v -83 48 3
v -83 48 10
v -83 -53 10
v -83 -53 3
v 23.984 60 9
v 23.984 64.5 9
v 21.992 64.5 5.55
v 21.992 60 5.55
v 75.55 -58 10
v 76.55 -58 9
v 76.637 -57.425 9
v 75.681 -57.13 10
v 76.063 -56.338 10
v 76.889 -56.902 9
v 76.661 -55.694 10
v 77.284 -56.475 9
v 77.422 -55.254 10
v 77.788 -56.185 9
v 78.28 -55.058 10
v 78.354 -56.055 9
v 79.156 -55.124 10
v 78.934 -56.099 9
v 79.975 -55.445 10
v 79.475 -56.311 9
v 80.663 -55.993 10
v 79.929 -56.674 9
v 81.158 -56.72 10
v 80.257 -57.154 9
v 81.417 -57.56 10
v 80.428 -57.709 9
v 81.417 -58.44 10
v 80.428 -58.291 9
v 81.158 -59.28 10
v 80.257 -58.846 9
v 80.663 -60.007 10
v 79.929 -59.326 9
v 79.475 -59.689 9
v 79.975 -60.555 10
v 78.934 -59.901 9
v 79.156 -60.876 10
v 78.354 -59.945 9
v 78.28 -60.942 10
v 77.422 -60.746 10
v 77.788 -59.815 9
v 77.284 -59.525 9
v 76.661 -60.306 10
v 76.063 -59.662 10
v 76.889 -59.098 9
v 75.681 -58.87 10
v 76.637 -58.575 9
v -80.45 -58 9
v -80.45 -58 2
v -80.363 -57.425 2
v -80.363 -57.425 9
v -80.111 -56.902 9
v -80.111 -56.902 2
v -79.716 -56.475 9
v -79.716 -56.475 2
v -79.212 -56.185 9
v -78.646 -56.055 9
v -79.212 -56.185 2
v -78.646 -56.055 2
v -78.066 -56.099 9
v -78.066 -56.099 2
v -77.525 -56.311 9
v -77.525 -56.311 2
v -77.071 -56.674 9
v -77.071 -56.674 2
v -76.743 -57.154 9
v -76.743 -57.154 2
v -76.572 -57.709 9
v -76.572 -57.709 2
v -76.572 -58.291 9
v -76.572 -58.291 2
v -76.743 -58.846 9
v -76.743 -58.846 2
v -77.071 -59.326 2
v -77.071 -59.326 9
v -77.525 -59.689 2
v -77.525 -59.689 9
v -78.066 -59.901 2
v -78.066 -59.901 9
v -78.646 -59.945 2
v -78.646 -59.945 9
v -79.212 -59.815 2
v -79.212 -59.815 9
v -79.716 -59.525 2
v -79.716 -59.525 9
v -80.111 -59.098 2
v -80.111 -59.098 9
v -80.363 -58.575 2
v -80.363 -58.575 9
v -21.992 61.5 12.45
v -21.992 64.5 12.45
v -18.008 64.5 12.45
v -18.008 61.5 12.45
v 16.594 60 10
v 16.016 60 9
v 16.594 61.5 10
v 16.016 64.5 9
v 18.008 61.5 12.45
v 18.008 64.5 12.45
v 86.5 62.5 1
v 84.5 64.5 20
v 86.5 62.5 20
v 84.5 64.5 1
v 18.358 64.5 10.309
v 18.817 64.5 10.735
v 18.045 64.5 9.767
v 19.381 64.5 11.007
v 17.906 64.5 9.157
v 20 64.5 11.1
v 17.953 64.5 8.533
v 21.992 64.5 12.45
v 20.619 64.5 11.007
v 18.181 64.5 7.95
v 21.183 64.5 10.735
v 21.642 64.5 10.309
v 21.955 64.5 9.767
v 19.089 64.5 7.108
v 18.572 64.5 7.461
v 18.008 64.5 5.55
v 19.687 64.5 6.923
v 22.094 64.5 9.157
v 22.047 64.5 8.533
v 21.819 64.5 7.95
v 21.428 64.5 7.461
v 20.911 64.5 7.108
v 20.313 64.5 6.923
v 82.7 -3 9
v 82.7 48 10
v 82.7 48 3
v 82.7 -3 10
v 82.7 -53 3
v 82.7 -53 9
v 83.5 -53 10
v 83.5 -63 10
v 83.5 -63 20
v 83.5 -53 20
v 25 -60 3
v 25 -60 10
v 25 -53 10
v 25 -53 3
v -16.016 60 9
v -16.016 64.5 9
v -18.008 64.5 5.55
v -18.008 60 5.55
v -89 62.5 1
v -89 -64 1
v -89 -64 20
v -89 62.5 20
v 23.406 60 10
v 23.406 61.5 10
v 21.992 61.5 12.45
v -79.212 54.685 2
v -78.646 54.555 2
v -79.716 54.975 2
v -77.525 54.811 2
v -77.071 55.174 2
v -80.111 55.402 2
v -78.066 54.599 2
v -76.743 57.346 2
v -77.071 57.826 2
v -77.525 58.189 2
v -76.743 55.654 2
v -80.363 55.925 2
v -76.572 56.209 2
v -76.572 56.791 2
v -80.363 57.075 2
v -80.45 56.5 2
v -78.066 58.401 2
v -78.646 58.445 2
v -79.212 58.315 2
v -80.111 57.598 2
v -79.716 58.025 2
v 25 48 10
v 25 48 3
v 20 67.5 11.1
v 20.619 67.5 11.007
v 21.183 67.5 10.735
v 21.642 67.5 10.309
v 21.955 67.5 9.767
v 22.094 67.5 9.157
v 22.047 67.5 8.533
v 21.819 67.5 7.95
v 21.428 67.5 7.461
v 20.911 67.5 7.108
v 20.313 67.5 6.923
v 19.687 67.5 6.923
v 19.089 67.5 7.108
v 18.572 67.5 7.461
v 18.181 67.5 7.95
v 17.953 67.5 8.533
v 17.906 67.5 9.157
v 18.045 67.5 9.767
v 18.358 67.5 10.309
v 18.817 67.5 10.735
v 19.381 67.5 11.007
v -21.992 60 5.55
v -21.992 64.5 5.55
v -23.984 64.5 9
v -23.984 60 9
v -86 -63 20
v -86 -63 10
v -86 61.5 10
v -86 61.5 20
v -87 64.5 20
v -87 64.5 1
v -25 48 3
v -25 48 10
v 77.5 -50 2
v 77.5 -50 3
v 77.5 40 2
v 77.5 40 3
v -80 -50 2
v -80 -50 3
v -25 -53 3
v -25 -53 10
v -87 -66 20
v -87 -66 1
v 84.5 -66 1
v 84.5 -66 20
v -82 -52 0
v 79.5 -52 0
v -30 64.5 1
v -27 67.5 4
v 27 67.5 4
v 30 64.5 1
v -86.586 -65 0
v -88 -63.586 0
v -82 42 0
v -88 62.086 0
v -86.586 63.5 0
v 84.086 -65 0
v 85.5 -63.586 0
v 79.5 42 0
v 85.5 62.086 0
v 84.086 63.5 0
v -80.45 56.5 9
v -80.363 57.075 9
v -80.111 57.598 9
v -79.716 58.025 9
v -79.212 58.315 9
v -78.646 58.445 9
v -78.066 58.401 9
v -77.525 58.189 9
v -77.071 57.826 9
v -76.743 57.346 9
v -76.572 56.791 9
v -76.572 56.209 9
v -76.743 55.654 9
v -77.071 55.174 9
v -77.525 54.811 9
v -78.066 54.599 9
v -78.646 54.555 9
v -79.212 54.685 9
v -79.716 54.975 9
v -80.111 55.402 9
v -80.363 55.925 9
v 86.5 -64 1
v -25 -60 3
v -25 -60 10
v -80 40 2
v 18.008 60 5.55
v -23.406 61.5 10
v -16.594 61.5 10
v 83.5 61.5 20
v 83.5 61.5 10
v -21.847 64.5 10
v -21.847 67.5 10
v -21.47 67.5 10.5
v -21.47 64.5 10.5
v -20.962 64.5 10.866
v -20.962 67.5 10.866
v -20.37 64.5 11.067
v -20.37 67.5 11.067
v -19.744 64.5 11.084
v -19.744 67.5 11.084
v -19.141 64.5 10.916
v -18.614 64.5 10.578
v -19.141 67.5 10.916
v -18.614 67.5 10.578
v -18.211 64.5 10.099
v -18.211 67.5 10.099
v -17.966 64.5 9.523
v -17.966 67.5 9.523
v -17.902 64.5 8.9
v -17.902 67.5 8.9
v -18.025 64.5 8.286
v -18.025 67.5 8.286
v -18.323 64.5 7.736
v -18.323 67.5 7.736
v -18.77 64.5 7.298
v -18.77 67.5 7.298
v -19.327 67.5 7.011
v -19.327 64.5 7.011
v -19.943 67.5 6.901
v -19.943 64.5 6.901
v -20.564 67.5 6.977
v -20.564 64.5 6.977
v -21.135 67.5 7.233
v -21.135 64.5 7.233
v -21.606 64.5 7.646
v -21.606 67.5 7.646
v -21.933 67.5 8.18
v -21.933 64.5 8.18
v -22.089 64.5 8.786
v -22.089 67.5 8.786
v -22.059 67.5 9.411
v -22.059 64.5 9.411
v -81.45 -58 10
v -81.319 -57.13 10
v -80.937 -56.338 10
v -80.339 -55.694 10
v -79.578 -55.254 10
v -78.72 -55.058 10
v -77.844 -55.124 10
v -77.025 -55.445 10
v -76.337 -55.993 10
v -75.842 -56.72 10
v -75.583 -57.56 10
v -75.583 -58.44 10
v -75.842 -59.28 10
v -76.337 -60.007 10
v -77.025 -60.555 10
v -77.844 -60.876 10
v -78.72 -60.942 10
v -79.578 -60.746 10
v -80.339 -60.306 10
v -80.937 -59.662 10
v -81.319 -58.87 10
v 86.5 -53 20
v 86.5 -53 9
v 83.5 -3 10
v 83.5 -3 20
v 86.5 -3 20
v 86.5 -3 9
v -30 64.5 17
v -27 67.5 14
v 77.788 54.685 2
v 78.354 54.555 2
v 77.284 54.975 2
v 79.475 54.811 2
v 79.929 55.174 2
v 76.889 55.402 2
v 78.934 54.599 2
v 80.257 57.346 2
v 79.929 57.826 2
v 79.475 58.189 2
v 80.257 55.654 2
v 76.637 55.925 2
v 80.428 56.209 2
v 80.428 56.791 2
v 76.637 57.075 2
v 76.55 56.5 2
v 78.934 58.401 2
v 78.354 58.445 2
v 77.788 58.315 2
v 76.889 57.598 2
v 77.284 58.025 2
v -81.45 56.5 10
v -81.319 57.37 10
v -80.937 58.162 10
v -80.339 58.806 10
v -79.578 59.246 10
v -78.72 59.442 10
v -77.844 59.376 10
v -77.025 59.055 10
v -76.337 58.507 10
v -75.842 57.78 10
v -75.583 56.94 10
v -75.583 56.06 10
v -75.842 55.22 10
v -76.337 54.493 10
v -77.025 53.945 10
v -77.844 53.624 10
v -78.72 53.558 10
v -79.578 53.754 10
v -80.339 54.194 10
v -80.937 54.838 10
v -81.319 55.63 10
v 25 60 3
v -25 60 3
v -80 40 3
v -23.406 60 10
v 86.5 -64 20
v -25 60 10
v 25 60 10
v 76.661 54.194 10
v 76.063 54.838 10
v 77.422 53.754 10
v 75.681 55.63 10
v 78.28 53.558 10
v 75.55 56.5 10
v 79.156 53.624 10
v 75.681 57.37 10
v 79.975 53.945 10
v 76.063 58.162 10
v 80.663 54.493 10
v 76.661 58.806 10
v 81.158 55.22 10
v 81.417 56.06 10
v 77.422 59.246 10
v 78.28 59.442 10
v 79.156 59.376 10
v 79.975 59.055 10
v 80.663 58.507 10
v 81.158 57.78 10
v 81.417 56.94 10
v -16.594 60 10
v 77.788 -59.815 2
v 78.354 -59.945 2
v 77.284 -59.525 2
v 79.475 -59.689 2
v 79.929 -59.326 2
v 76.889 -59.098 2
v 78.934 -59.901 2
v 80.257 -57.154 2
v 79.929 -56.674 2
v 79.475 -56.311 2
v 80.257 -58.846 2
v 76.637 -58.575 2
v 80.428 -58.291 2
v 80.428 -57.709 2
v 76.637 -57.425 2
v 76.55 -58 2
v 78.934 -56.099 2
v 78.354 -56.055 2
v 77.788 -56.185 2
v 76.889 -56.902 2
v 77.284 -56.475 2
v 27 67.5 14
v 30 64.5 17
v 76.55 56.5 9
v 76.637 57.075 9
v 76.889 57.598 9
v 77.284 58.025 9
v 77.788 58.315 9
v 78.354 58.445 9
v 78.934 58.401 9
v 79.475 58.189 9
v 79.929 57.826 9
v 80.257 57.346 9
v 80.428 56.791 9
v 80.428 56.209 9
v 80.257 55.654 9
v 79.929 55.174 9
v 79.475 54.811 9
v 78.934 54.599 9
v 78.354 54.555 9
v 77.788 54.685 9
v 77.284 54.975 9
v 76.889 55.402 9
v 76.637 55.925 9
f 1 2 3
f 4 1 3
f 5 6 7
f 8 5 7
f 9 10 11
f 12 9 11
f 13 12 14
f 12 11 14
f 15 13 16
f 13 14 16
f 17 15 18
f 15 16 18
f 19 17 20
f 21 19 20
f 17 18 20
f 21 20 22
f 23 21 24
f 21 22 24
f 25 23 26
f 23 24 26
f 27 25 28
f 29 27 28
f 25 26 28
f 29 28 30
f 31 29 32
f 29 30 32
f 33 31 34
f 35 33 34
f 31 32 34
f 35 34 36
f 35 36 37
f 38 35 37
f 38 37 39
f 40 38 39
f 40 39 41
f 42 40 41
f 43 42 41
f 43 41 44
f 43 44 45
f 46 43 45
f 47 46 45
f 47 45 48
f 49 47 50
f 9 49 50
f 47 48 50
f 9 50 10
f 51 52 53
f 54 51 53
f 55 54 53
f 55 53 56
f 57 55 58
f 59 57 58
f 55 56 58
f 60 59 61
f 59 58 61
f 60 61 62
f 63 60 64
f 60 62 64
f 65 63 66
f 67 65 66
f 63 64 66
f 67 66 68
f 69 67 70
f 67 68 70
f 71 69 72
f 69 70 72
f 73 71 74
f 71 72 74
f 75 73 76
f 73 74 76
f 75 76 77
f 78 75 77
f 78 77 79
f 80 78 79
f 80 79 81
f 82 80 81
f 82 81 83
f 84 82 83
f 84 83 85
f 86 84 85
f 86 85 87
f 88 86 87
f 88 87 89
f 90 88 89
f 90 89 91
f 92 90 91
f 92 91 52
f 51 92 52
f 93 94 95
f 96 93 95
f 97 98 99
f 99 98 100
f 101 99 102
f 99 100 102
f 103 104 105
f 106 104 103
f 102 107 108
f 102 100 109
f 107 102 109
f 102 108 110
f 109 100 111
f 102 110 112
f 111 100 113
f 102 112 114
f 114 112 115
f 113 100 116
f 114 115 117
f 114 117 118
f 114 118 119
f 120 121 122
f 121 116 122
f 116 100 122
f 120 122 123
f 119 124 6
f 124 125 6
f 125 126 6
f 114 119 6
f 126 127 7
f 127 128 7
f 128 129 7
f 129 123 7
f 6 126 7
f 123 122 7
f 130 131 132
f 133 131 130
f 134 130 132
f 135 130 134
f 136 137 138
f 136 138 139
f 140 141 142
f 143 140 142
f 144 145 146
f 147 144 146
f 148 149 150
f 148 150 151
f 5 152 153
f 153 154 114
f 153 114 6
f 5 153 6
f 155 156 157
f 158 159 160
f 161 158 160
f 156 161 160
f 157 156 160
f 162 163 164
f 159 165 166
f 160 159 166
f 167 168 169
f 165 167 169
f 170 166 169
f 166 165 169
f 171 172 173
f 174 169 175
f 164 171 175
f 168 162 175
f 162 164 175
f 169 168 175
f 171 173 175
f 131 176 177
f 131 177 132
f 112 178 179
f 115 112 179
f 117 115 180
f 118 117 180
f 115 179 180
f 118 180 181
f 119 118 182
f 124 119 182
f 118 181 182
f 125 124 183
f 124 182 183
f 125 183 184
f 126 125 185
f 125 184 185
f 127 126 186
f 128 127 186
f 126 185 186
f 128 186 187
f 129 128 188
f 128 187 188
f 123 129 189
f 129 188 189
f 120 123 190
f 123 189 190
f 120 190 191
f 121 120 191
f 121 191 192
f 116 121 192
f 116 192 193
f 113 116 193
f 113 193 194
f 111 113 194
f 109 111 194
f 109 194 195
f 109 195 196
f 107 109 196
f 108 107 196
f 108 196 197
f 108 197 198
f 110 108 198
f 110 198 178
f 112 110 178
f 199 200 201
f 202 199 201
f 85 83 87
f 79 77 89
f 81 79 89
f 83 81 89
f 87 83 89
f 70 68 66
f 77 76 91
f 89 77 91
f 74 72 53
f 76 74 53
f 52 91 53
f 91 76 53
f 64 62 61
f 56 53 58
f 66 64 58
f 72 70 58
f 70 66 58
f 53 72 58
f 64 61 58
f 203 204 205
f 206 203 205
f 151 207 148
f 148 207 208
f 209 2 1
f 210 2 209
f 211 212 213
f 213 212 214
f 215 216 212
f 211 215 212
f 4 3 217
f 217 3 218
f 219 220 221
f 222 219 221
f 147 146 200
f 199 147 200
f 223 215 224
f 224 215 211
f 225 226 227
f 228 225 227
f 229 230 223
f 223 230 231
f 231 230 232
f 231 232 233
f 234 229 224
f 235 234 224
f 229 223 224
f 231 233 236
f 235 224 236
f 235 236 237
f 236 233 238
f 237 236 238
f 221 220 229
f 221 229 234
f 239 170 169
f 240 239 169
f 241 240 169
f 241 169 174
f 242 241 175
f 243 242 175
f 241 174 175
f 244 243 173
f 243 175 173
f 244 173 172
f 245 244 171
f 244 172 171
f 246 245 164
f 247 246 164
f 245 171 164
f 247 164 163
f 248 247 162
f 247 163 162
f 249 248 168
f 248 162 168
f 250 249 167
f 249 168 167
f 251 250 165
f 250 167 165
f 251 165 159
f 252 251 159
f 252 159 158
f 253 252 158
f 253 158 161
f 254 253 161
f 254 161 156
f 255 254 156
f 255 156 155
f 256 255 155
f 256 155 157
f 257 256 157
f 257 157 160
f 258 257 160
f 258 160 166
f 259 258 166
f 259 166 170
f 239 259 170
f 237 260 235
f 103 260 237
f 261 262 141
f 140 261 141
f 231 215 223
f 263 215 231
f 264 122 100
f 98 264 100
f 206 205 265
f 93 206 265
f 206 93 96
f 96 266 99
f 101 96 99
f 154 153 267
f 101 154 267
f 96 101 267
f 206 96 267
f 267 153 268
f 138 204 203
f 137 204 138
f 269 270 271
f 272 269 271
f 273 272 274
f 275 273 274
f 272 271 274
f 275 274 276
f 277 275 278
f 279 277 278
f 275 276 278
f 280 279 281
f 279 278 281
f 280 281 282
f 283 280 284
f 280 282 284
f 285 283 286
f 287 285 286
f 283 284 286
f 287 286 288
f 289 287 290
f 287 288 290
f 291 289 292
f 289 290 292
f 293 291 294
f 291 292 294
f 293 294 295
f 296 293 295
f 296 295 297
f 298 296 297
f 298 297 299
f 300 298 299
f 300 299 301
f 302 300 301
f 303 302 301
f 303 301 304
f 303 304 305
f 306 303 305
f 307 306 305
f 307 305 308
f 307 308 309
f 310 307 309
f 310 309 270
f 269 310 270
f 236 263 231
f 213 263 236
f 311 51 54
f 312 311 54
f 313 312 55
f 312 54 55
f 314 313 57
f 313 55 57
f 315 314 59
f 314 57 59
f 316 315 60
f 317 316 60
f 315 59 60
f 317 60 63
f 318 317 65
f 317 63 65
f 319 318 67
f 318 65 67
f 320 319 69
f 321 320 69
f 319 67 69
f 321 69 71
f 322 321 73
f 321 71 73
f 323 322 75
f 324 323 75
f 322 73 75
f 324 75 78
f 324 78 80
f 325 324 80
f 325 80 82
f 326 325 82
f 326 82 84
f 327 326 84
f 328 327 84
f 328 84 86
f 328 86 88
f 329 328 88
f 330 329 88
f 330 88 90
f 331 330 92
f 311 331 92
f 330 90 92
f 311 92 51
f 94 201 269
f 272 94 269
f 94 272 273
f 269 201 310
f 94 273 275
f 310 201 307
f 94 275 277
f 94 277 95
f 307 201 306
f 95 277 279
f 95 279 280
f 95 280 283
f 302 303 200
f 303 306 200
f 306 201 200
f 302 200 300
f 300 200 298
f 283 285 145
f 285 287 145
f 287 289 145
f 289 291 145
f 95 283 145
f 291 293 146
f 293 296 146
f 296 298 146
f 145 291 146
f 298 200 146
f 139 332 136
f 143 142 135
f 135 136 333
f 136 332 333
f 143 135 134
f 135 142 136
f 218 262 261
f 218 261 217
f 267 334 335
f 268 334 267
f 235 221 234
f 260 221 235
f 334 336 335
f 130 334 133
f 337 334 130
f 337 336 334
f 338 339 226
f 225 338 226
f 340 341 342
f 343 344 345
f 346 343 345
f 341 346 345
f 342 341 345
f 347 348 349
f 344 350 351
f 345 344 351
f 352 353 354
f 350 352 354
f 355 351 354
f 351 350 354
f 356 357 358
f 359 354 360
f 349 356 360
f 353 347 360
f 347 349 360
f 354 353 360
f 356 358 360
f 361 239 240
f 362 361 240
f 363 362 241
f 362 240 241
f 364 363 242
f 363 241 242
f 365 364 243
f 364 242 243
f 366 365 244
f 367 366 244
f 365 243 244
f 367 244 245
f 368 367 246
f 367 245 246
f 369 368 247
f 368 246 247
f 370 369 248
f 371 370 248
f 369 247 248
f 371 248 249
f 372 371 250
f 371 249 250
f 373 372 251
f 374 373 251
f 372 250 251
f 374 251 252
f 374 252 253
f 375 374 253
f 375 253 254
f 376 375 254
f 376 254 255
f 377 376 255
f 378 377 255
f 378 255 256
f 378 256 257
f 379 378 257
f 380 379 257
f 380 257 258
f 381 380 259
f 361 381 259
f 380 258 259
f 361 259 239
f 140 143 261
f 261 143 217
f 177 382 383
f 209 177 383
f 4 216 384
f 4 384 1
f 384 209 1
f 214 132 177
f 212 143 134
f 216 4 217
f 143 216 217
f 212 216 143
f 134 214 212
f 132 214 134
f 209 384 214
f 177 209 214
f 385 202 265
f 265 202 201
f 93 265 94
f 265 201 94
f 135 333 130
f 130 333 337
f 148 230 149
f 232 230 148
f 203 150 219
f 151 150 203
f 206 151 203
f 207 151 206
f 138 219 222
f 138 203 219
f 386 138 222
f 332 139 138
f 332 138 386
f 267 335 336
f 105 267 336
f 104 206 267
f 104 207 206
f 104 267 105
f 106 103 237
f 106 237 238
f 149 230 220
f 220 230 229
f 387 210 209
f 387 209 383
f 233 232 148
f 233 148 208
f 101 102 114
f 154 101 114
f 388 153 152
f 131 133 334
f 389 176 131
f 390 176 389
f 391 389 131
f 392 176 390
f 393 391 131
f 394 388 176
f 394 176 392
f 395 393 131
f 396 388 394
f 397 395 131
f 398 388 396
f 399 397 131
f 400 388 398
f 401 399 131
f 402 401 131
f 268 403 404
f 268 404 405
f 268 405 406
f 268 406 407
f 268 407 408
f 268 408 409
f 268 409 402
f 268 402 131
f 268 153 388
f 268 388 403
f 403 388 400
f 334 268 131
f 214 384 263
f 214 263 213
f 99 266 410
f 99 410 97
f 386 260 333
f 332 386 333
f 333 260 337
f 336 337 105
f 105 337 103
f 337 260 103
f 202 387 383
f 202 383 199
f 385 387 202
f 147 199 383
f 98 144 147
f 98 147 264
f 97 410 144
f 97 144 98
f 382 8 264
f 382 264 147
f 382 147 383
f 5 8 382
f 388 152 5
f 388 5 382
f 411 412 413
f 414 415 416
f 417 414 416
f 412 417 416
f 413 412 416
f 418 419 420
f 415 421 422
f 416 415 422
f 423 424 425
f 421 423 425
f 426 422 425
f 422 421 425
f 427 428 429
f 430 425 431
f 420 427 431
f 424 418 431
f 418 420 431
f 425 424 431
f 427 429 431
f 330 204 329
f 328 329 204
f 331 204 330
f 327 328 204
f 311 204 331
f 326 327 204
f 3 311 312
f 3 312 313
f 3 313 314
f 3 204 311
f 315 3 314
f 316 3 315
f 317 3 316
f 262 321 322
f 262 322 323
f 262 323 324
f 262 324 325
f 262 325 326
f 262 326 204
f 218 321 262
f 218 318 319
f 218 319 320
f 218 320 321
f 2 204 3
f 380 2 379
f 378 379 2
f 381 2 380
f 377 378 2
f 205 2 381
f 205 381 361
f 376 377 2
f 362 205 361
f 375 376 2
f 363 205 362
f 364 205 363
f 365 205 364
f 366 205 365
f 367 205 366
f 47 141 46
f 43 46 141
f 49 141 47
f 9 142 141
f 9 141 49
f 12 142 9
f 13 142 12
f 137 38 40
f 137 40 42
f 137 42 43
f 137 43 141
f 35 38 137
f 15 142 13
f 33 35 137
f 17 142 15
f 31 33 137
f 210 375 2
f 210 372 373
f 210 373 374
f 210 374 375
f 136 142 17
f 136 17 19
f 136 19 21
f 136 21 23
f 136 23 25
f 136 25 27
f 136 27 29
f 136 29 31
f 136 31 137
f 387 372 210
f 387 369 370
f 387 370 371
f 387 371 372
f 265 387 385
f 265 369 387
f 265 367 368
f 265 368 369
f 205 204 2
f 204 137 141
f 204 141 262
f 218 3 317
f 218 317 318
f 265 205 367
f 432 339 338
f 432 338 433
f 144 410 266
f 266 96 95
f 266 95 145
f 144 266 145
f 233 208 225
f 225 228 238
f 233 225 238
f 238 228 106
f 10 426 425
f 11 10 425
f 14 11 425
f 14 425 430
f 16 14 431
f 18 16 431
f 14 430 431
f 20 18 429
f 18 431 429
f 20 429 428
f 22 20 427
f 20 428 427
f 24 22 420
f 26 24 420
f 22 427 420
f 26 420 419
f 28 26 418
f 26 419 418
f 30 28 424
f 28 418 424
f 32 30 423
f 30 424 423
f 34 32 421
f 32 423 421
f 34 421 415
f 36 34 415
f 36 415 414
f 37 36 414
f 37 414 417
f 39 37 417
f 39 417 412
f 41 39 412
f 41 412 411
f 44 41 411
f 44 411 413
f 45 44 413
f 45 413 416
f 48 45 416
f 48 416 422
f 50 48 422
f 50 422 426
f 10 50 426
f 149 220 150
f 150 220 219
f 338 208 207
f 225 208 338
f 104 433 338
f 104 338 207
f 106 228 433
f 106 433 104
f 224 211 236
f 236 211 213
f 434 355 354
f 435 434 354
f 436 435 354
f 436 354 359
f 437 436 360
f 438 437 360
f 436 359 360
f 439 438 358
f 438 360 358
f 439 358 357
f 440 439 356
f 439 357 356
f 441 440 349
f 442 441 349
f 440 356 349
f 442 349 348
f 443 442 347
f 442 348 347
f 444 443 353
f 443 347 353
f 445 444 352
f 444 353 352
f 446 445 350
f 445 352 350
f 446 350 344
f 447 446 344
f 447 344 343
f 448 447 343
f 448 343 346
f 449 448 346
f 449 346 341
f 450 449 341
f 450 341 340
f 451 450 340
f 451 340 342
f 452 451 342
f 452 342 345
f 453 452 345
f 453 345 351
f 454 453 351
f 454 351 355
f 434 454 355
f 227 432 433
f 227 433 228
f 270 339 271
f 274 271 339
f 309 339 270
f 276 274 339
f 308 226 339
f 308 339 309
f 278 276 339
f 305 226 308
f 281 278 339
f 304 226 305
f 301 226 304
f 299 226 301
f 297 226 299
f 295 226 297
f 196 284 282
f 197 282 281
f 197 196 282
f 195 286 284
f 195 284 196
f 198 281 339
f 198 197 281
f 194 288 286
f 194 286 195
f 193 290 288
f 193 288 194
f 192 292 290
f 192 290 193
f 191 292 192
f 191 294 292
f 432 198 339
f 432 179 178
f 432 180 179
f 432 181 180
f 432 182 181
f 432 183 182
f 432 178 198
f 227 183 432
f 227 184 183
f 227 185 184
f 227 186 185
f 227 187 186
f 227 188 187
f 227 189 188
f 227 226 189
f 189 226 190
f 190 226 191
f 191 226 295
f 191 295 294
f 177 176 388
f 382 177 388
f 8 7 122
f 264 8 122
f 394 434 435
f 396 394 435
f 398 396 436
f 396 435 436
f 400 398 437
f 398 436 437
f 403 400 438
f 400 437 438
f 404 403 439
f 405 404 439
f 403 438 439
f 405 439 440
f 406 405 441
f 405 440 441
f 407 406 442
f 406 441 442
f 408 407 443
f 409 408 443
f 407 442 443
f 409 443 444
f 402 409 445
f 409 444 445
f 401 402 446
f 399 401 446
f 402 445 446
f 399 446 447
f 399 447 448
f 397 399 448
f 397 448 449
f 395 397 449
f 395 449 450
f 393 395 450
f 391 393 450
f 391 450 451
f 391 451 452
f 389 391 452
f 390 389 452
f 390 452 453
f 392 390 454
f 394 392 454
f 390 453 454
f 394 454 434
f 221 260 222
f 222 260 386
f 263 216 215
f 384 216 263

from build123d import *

# Parameters (mm, degrees)
CROQUIS1_W              = 218
CROQUIS1_H              = 145
SALIENTE_EXTRUIR1_DEPTH = 10
CORTAR_EXTRUIR1_DEPTH   = 7
CROQUIS3_W              = 157.5
CROQUIS3_H              = 90
CORTAR_EXTRUIR2_DEPTH   = 132.096338622
CHAFL_N1_SIZE           = 2
CORTAR_EXTRUIR3_START   = -2
CROQUIS4_R              = 1.95
CORTAR_EXTRUIR3_DEPTH   = 130.290707973
CROQUIS5_W              = 50
CROQUIS5_H              = 12
CORTAR_EXTRUIR4_DEPTH   = 7
CHAFL_N3_SIZE           = 1
CROQUIS6_OUTSIDE_W      = 272.402
CROQUIS6_OUTSIDE_H      = 199.402
CROQUIS6_OUTSIDE_W_2    = 175.5
CROQUIS6_OUTSIDE_H_2    = 130.5
CORTAR_EXTRUIR5_DEPTH   = 132.290707973
CROQUIS7_W              = 175.5
CROQUIS7_H              = 130.5
CROQUIS7_W_2            = 169.5
CROQUIS7_H_2            = 124.5
SALIENTE_EXTRUIR2_DEPTH = 10
CHAFL_N4_SIZE           = 2
CHAFL_N5_SIZE           = 1
CORTAR_EXTRUIR6_REACH   = 190.564
CROQUIS8_W              = 11
CROQUIS8_H              = 50
CROQUIS9_W              = 60
CROQUIS9_H              = 16
SALIENTE_EXTRUIR3_DEPTH = 3
CHAFL_N6_SIZE           = 3
CORTAR_EXTRUIR7_REACH   = 163.689
CROQUIS10_R             = 2.1
CORTAR_EXTRUIR8_REACH   = 166.689
CORTAR_EXTRUIR8_START   = -3


with BuildPart() as part:
    # Croquis1 → Saliente-Extruir1 (new body)
    with BuildSketch(Plane.XY):
        Rectangle(CROQUIS1_W, CROQUIS1_H)
    extrude(amount=SALIENTE_EXTRUIR1_DEPTH)

    # Croquis2 → Cortar-Extruir1 (cut)
    with BuildSketch(Plane.XY.offset(10)):
        Polygon((-83, 43), (-83, 48), (82.7, 48), (82.7, -53), (80.5, -53), (-83, -53), align=None)
    extrude(amount=-CORTAR_EXTRUIR1_DEPTH, mode=Mode.SUBTRACT)

    # Croquis3 → Cortar-Extruir2 (cut, through all)
    with BuildSketch(Plane.XY.offset(3)):
        with Locations((-1.25, -5)):
            Rectangle(CROQUIS3_W, CROQUIS3_H)
    extrude(amount=-CORTAR_EXTRUIR2_DEPTH, mode=Mode.SUBTRACT)

    # Chaflán1
    chafl_n1_edges = [part.edges().sort_by_distance(p)[0] for p in [
        (-80, -5, 0),
        (-1.25, 40, 0),
        (77.5, -5, 0),
        (-1.25, -50, 0),
    ]]
    chamfer(chafl_n1_edges, length=CHAFL_N1_SIZE)

    # Croquis4 → Cortar-Extruir3 (cut, through all)
    with BuildSketch(Plane(origin=(0, 0, 0), x_dir=(-1, 0, 0), z_dir=(0, 0, -1)).offset(CORTAR_EXTRUIR3_START)):
        with Locations((-78.5, 56.5)):
            Circle(CROQUIS4_R)
        with Locations((78.5, 56.5)):
            Circle(CROQUIS4_R)
        with Locations((78.5, -58)):
            Circle(CROQUIS4_R)
        with Locations((-78.5, -58)):
            Circle(CROQUIS4_R)
    extrude(amount=-CORTAR_EXTRUIR3_DEPTH, mode=Mode.SUBTRACT)

    # Croquis5 → Cortar-Extruir4 (cut)
    with BuildSketch(Plane.XY.offset(10)):
        with Locations((0, 54)):
            Rectangle(CROQUIS5_W, CROQUIS5_H)
        with Locations((0, -54)):
            Rectangle(CROQUIS5_W, CROQUIS5_H)
    extrude(amount=-CORTAR_EXTRUIR4_DEPTH, mode=Mode.SUBTRACT)

    # Chaflán3
    chafl_n3_edges = [part.edges().sort_by_distance(p)[0] for p in [
        (80.45, -58, 10),
        (-76.55, -58, 10),
        (-76.55, 56.5, 10),
        (80.45, 56.5, 10),
    ]]
    chamfer(chafl_n3_edges, length=CHAFL_N3_SIZE)

    # Croquis6 outside → Cortar-Extruir5 (cut, through all)
    with BuildSketch(Plane.XY.offset(10)):
        Rectangle(CROQUIS6_OUTSIDE_W, CROQUIS6_OUTSIDE_H)
        with Locations((-1.25, -0.75)):
            Rectangle(CROQUIS6_OUTSIDE_W_2, CROQUIS6_OUTSIDE_H_2, mode=Mode.SUBTRACT)
    extrude(amount=-CORTAR_EXTRUIR5_DEPTH, mode=Mode.SUBTRACT)

    # Croquis7 → Saliente-Extruir2 (add)
    with BuildSketch(Plane.XY.offset(10)):
        with Locations((-1.25, -0.75)):
            Rectangle(CROQUIS7_W, CROQUIS7_H)
        with Locations((-1.25, -0.75)):
            Rectangle(CROQUIS7_W_2, CROQUIS7_H_2, mode=Mode.SUBTRACT)
    extrude(amount=SALIENTE_EXTRUIR2_DEPTH)

    # Chaflán4
    chafl_n4_edges = [part.edges().sort_by_distance(p)[0] for p in [
        (-89, 64.5, 10),
        (86.5, 64.5, 10),
        (86.5, -66, 10),
        (-89, -66, 10),
    ]]
    chamfer(chafl_n4_edges, length=CHAFL_N4_SIZE)

    # Chaflán5
    chafl_n5_edges = [part.edges().sort_by_distance(p)[0] for p in [
        (86.5, -0.75, 0),
        (-1.25, 64.5, 0),
        (-89, -0.75, 0),
        (-1.25, -66, 0),
        (-88, 63.5, 0),
        (-88, -65, 0),
        (85.5, -65, 0),
        (85.5, 63.5, 0),
    ]]
    chamfer(chafl_n5_edges, length=CHAFL_N5_SIZE)

    # Croquis8 → Cortar-Extruir6 (cut, up to next)
    with BuildSketch(Plane(origin=(86.5, 0, 0), x_dir=(0, 0, -1), z_dir=(1, 0, 0)), mode=Mode.PRIVATE) as cortar_extruir6_sk1:
        with Locations((-14.5, -28)):
            Rectangle(CROQUIS8_W, CROQUIS8_H)
    cortar_extruir6_tool1 = extrude(cortar_extruir6_sk1.sketch, amount=-CORTAR_EXTRUIR6_REACH, mode=Mode.PRIVATE) & part.part
    add(cortar_extruir6_tool1.solids().sort_by_distance((86.5, -28, 14.5))[0], mode=Mode.SUBTRACT)

    # Croquis9 → Saliente-Extruir3 (add)
    with BuildSketch(Plane(origin=(0, 64.5, 0), x_dir=(1, 0, 0), z_dir=(0, 1, 0))):
        with Locations((0, -9)):
            Rectangle(CROQUIS9_W, CROQUIS9_H)
    extrude(amount=SALIENTE_EXTRUIR3_DEPTH)

    # Chaflán6
    chafl_n6_edges = [part.edges().sort_by_distance(p)[0] for p in [
        (0, 67.5, 17),
        (-30, 67.5, 9),
        (0, 67.5, 1),
        (30, 67.5, 9),
    ]]
    chamfer(chafl_n6_edges, length=CHAFL_N6_SIZE - 0.0001)  # a hair under: the kernel refuses the full size

    # Croquis10 → Cortar-Extruir7 (cut, up to next)
    with BuildSketch(Plane(origin=(0, 67.5, 0), x_dir=(1, 0, 0), z_dir=(0, 1, 0)), mode=Mode.PRIVATE) as cortar_extruir7_sk1:
        with Locations(Location((20, -9, 0), (0, 0, 270))):
            Circle(CROQUIS10_R)
    cortar_extruir7_tool1 = extrude(cortar_extruir7_sk1.sketch, amount=-CORTAR_EXTRUIR7_REACH, mode=Mode.PRIVATE) & part.part
    # Croquis10 → Cortar-Extruir7 (cut, up to next)
    with BuildSketch(Plane(origin=(0, 67.5, 0), x_dir=(1, 0, 0), z_dir=(0, 1, 0)), mode=Mode.PRIVATE) as cortar_extruir7_sk2:
        with Locations(Location((-20, -9, 0), (0, 0, 208.436890149))):
            Circle(CROQUIS10_R)
    cortar_extruir7_tool2 = extrude(cortar_extruir7_sk2.sketch, amount=-CORTAR_EXTRUIR7_REACH, mode=Mode.PRIVATE) & part.part
    add(cortar_extruir7_tool1.solids().sort_by_distance((20, 67.5, 9))[0], mode=Mode.SUBTRACT)
    add(cortar_extruir7_tool2.solids().sort_by_distance((-20, 67.5, 9))[0], mode=Mode.SUBTRACT)

    # Croquis11 → Cortar-Extruir8 (cut, up to next)
    with BuildSketch(Plane(origin=(0, 67.5, 0), x_dir=(1, 0, 0), z_dir=(0, 1, 0)).offset(CORTAR_EXTRUIR8_START), mode=Mode.PRIVATE) as cortar_extruir8_sk1:
        Polygon((23.983716857, -9), (21.991858429, -5.55), (18.008141571, -5.55), (16.016283143, -9), (18.008141571, -12.45), (21.991858429, -12.45), align=None)
    cortar_extruir8_tool1 = extrude(cortar_extruir8_sk1.sketch, amount=-CORTAR_EXTRUIR8_REACH, mode=Mode.PRIVATE) & part.part
    # Croquis11 → Cortar-Extruir8 (cut, up to next)
    with BuildSketch(Plane(origin=(0, 67.5, 0), x_dir=(1, 0, 0), z_dir=(0, 1, 0)).offset(CORTAR_EXTRUIR8_START), mode=Mode.PRIVATE) as cortar_extruir8_sk2:
        Polygon((-16.016283143, -9), (-18.008141571, -5.55), (-21.991858429, -5.55), (-23.983716857, -9), (-21.991858429, -12.45), (-18.008141571, -12.45), align=None)
    cortar_extruir8_tool2 = extrude(cortar_extruir8_sk2.sketch, amount=-CORTAR_EXTRUIR8_REACH, mode=Mode.PRIVATE) & part.part
    add(cortar_extruir8_tool1.solids().sort_by_distance((20, 64.5, 9))[0], mode=Mode.SUBTRACT)
    add(cortar_extruir8_tool2.solids().sort_by_distance((-20, 64.5, 9))[0], mode=Mode.SUBTRACT)


solid = part.part
